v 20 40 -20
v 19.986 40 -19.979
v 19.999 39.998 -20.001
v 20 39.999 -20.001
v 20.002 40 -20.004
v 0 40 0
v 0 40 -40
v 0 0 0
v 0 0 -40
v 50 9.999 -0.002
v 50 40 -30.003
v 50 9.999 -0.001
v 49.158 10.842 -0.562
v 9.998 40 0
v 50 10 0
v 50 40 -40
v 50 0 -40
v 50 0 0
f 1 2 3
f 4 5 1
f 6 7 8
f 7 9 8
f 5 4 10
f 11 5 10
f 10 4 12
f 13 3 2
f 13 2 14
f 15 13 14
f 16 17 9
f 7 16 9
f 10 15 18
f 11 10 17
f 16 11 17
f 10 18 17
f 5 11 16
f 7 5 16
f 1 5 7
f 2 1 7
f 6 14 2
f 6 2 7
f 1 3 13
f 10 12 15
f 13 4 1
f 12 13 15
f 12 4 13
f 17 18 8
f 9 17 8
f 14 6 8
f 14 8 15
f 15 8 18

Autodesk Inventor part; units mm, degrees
ref_plane "YZ Plane" through (0, 0, 0) normal (1, 0, 0) x (0, 1, 0)
sketch "草圖1" plane through (0, 0, 0) normal (0, 1, 0) x (-1, 0, 0)
  line L0 (0, 0) -> (-50, 0)
  line L1 (-50, 0) -> (-50, -40)
  line L2 (-50, -40) -> (0, -40)
  line L3 (0, -40) -> (0, 0)
  dimension "d0" = 40
  dimension "d1" = 50
extrude "擠出1" add sketch "草圖1" along normal blind 40
sketch "草圖2" plane through (0, 0, 0) normal (0, 0, 1) x (1, 0, 0)
  line L0 (50, 10) -> (10, 40)
  line L1 (0, 40) -> (50, 40) projected
  line L2 (50, 0) -> (50, 40) projected
  point P0 (0, 0)
  dimension "d4" = 30
  dimension "d5" = 40
sketch "草圖3" plane through (0, 40, 0) normal (0, 1, 0) x (1, 0, 0)
  line L0 (0, 0) -> (50, 0) projected
  line L1 (50, 0) -> (50, 40) projected
  point P0 (20, 20)
  dimension "d6" = 20
  dimension "d7" = 30
ref_plane "工作平面1" through (20, 40, -20) normal (0.5747, 0.7663, 0.2873) x (-0.4472, 0, 0.8944)
sketch "草圖4" plane through (20, 40, -20) normal (0.5747, 0.7663, 0.2873) x (-0.4472, 0, 0.8944)
  line L0 (0, 0) -> (4.4721, 46.6905)
  line L1 (4.4721, 46.6905) -> (47.828, 42.5377)
  line L2 (47.828, 42.5377) -> (43.3559, -4.1527)
  line L3 (43.3559, -4.1527) -> (0, 0)
  point P0 (26.8328, 18.8475)
extrude "擠出2" cut sketch "草圖4" along normal blind 40
sketch "草圖5" plane through (50, 0, 0) normal (1, 0, 0) x (0, 0, -1)
  line L0 (2.1429, 40) -> (0, 10) projected
  line L1 (0, 10) -> (30, 40)
  line L2 (40, 40) -> (0, 40) projected
  point P0 (0, 0)
  dimension "d10" = 30
ref_plane "工作平面2" through (50, 40, -30) normal (-0.2294, -0.6882, -0.6882) x (0, -0.7071, 0.7071)
sketch "草圖6" plane through (50, 40, -30) normal (-0.2294, -0.6882, -0.6882) x (0, -0.7071, 0.7071)
  line L0 (7.0711, 30.8221) -> (19.698, 4.519) projected
  line L1 (19.698, 4.519) -> (42.4264, 0) projected
  line L2 (7.0711, 30.8221) -> (42.4264, 0)
  line L3 (42.4264, 0) -> (18.1406, -27.8578)
  line L4 (18.1406, -27.8578) -> (-17.2148, 2.9643)
  line L5 (-17.2148, 2.9643) -> (7.0711, 30.8221)
  point P0 (49.4975, 47.0442)
extrude "擠出3" cut sketch "草圖6" against normal blind 40
properties part number "24"
